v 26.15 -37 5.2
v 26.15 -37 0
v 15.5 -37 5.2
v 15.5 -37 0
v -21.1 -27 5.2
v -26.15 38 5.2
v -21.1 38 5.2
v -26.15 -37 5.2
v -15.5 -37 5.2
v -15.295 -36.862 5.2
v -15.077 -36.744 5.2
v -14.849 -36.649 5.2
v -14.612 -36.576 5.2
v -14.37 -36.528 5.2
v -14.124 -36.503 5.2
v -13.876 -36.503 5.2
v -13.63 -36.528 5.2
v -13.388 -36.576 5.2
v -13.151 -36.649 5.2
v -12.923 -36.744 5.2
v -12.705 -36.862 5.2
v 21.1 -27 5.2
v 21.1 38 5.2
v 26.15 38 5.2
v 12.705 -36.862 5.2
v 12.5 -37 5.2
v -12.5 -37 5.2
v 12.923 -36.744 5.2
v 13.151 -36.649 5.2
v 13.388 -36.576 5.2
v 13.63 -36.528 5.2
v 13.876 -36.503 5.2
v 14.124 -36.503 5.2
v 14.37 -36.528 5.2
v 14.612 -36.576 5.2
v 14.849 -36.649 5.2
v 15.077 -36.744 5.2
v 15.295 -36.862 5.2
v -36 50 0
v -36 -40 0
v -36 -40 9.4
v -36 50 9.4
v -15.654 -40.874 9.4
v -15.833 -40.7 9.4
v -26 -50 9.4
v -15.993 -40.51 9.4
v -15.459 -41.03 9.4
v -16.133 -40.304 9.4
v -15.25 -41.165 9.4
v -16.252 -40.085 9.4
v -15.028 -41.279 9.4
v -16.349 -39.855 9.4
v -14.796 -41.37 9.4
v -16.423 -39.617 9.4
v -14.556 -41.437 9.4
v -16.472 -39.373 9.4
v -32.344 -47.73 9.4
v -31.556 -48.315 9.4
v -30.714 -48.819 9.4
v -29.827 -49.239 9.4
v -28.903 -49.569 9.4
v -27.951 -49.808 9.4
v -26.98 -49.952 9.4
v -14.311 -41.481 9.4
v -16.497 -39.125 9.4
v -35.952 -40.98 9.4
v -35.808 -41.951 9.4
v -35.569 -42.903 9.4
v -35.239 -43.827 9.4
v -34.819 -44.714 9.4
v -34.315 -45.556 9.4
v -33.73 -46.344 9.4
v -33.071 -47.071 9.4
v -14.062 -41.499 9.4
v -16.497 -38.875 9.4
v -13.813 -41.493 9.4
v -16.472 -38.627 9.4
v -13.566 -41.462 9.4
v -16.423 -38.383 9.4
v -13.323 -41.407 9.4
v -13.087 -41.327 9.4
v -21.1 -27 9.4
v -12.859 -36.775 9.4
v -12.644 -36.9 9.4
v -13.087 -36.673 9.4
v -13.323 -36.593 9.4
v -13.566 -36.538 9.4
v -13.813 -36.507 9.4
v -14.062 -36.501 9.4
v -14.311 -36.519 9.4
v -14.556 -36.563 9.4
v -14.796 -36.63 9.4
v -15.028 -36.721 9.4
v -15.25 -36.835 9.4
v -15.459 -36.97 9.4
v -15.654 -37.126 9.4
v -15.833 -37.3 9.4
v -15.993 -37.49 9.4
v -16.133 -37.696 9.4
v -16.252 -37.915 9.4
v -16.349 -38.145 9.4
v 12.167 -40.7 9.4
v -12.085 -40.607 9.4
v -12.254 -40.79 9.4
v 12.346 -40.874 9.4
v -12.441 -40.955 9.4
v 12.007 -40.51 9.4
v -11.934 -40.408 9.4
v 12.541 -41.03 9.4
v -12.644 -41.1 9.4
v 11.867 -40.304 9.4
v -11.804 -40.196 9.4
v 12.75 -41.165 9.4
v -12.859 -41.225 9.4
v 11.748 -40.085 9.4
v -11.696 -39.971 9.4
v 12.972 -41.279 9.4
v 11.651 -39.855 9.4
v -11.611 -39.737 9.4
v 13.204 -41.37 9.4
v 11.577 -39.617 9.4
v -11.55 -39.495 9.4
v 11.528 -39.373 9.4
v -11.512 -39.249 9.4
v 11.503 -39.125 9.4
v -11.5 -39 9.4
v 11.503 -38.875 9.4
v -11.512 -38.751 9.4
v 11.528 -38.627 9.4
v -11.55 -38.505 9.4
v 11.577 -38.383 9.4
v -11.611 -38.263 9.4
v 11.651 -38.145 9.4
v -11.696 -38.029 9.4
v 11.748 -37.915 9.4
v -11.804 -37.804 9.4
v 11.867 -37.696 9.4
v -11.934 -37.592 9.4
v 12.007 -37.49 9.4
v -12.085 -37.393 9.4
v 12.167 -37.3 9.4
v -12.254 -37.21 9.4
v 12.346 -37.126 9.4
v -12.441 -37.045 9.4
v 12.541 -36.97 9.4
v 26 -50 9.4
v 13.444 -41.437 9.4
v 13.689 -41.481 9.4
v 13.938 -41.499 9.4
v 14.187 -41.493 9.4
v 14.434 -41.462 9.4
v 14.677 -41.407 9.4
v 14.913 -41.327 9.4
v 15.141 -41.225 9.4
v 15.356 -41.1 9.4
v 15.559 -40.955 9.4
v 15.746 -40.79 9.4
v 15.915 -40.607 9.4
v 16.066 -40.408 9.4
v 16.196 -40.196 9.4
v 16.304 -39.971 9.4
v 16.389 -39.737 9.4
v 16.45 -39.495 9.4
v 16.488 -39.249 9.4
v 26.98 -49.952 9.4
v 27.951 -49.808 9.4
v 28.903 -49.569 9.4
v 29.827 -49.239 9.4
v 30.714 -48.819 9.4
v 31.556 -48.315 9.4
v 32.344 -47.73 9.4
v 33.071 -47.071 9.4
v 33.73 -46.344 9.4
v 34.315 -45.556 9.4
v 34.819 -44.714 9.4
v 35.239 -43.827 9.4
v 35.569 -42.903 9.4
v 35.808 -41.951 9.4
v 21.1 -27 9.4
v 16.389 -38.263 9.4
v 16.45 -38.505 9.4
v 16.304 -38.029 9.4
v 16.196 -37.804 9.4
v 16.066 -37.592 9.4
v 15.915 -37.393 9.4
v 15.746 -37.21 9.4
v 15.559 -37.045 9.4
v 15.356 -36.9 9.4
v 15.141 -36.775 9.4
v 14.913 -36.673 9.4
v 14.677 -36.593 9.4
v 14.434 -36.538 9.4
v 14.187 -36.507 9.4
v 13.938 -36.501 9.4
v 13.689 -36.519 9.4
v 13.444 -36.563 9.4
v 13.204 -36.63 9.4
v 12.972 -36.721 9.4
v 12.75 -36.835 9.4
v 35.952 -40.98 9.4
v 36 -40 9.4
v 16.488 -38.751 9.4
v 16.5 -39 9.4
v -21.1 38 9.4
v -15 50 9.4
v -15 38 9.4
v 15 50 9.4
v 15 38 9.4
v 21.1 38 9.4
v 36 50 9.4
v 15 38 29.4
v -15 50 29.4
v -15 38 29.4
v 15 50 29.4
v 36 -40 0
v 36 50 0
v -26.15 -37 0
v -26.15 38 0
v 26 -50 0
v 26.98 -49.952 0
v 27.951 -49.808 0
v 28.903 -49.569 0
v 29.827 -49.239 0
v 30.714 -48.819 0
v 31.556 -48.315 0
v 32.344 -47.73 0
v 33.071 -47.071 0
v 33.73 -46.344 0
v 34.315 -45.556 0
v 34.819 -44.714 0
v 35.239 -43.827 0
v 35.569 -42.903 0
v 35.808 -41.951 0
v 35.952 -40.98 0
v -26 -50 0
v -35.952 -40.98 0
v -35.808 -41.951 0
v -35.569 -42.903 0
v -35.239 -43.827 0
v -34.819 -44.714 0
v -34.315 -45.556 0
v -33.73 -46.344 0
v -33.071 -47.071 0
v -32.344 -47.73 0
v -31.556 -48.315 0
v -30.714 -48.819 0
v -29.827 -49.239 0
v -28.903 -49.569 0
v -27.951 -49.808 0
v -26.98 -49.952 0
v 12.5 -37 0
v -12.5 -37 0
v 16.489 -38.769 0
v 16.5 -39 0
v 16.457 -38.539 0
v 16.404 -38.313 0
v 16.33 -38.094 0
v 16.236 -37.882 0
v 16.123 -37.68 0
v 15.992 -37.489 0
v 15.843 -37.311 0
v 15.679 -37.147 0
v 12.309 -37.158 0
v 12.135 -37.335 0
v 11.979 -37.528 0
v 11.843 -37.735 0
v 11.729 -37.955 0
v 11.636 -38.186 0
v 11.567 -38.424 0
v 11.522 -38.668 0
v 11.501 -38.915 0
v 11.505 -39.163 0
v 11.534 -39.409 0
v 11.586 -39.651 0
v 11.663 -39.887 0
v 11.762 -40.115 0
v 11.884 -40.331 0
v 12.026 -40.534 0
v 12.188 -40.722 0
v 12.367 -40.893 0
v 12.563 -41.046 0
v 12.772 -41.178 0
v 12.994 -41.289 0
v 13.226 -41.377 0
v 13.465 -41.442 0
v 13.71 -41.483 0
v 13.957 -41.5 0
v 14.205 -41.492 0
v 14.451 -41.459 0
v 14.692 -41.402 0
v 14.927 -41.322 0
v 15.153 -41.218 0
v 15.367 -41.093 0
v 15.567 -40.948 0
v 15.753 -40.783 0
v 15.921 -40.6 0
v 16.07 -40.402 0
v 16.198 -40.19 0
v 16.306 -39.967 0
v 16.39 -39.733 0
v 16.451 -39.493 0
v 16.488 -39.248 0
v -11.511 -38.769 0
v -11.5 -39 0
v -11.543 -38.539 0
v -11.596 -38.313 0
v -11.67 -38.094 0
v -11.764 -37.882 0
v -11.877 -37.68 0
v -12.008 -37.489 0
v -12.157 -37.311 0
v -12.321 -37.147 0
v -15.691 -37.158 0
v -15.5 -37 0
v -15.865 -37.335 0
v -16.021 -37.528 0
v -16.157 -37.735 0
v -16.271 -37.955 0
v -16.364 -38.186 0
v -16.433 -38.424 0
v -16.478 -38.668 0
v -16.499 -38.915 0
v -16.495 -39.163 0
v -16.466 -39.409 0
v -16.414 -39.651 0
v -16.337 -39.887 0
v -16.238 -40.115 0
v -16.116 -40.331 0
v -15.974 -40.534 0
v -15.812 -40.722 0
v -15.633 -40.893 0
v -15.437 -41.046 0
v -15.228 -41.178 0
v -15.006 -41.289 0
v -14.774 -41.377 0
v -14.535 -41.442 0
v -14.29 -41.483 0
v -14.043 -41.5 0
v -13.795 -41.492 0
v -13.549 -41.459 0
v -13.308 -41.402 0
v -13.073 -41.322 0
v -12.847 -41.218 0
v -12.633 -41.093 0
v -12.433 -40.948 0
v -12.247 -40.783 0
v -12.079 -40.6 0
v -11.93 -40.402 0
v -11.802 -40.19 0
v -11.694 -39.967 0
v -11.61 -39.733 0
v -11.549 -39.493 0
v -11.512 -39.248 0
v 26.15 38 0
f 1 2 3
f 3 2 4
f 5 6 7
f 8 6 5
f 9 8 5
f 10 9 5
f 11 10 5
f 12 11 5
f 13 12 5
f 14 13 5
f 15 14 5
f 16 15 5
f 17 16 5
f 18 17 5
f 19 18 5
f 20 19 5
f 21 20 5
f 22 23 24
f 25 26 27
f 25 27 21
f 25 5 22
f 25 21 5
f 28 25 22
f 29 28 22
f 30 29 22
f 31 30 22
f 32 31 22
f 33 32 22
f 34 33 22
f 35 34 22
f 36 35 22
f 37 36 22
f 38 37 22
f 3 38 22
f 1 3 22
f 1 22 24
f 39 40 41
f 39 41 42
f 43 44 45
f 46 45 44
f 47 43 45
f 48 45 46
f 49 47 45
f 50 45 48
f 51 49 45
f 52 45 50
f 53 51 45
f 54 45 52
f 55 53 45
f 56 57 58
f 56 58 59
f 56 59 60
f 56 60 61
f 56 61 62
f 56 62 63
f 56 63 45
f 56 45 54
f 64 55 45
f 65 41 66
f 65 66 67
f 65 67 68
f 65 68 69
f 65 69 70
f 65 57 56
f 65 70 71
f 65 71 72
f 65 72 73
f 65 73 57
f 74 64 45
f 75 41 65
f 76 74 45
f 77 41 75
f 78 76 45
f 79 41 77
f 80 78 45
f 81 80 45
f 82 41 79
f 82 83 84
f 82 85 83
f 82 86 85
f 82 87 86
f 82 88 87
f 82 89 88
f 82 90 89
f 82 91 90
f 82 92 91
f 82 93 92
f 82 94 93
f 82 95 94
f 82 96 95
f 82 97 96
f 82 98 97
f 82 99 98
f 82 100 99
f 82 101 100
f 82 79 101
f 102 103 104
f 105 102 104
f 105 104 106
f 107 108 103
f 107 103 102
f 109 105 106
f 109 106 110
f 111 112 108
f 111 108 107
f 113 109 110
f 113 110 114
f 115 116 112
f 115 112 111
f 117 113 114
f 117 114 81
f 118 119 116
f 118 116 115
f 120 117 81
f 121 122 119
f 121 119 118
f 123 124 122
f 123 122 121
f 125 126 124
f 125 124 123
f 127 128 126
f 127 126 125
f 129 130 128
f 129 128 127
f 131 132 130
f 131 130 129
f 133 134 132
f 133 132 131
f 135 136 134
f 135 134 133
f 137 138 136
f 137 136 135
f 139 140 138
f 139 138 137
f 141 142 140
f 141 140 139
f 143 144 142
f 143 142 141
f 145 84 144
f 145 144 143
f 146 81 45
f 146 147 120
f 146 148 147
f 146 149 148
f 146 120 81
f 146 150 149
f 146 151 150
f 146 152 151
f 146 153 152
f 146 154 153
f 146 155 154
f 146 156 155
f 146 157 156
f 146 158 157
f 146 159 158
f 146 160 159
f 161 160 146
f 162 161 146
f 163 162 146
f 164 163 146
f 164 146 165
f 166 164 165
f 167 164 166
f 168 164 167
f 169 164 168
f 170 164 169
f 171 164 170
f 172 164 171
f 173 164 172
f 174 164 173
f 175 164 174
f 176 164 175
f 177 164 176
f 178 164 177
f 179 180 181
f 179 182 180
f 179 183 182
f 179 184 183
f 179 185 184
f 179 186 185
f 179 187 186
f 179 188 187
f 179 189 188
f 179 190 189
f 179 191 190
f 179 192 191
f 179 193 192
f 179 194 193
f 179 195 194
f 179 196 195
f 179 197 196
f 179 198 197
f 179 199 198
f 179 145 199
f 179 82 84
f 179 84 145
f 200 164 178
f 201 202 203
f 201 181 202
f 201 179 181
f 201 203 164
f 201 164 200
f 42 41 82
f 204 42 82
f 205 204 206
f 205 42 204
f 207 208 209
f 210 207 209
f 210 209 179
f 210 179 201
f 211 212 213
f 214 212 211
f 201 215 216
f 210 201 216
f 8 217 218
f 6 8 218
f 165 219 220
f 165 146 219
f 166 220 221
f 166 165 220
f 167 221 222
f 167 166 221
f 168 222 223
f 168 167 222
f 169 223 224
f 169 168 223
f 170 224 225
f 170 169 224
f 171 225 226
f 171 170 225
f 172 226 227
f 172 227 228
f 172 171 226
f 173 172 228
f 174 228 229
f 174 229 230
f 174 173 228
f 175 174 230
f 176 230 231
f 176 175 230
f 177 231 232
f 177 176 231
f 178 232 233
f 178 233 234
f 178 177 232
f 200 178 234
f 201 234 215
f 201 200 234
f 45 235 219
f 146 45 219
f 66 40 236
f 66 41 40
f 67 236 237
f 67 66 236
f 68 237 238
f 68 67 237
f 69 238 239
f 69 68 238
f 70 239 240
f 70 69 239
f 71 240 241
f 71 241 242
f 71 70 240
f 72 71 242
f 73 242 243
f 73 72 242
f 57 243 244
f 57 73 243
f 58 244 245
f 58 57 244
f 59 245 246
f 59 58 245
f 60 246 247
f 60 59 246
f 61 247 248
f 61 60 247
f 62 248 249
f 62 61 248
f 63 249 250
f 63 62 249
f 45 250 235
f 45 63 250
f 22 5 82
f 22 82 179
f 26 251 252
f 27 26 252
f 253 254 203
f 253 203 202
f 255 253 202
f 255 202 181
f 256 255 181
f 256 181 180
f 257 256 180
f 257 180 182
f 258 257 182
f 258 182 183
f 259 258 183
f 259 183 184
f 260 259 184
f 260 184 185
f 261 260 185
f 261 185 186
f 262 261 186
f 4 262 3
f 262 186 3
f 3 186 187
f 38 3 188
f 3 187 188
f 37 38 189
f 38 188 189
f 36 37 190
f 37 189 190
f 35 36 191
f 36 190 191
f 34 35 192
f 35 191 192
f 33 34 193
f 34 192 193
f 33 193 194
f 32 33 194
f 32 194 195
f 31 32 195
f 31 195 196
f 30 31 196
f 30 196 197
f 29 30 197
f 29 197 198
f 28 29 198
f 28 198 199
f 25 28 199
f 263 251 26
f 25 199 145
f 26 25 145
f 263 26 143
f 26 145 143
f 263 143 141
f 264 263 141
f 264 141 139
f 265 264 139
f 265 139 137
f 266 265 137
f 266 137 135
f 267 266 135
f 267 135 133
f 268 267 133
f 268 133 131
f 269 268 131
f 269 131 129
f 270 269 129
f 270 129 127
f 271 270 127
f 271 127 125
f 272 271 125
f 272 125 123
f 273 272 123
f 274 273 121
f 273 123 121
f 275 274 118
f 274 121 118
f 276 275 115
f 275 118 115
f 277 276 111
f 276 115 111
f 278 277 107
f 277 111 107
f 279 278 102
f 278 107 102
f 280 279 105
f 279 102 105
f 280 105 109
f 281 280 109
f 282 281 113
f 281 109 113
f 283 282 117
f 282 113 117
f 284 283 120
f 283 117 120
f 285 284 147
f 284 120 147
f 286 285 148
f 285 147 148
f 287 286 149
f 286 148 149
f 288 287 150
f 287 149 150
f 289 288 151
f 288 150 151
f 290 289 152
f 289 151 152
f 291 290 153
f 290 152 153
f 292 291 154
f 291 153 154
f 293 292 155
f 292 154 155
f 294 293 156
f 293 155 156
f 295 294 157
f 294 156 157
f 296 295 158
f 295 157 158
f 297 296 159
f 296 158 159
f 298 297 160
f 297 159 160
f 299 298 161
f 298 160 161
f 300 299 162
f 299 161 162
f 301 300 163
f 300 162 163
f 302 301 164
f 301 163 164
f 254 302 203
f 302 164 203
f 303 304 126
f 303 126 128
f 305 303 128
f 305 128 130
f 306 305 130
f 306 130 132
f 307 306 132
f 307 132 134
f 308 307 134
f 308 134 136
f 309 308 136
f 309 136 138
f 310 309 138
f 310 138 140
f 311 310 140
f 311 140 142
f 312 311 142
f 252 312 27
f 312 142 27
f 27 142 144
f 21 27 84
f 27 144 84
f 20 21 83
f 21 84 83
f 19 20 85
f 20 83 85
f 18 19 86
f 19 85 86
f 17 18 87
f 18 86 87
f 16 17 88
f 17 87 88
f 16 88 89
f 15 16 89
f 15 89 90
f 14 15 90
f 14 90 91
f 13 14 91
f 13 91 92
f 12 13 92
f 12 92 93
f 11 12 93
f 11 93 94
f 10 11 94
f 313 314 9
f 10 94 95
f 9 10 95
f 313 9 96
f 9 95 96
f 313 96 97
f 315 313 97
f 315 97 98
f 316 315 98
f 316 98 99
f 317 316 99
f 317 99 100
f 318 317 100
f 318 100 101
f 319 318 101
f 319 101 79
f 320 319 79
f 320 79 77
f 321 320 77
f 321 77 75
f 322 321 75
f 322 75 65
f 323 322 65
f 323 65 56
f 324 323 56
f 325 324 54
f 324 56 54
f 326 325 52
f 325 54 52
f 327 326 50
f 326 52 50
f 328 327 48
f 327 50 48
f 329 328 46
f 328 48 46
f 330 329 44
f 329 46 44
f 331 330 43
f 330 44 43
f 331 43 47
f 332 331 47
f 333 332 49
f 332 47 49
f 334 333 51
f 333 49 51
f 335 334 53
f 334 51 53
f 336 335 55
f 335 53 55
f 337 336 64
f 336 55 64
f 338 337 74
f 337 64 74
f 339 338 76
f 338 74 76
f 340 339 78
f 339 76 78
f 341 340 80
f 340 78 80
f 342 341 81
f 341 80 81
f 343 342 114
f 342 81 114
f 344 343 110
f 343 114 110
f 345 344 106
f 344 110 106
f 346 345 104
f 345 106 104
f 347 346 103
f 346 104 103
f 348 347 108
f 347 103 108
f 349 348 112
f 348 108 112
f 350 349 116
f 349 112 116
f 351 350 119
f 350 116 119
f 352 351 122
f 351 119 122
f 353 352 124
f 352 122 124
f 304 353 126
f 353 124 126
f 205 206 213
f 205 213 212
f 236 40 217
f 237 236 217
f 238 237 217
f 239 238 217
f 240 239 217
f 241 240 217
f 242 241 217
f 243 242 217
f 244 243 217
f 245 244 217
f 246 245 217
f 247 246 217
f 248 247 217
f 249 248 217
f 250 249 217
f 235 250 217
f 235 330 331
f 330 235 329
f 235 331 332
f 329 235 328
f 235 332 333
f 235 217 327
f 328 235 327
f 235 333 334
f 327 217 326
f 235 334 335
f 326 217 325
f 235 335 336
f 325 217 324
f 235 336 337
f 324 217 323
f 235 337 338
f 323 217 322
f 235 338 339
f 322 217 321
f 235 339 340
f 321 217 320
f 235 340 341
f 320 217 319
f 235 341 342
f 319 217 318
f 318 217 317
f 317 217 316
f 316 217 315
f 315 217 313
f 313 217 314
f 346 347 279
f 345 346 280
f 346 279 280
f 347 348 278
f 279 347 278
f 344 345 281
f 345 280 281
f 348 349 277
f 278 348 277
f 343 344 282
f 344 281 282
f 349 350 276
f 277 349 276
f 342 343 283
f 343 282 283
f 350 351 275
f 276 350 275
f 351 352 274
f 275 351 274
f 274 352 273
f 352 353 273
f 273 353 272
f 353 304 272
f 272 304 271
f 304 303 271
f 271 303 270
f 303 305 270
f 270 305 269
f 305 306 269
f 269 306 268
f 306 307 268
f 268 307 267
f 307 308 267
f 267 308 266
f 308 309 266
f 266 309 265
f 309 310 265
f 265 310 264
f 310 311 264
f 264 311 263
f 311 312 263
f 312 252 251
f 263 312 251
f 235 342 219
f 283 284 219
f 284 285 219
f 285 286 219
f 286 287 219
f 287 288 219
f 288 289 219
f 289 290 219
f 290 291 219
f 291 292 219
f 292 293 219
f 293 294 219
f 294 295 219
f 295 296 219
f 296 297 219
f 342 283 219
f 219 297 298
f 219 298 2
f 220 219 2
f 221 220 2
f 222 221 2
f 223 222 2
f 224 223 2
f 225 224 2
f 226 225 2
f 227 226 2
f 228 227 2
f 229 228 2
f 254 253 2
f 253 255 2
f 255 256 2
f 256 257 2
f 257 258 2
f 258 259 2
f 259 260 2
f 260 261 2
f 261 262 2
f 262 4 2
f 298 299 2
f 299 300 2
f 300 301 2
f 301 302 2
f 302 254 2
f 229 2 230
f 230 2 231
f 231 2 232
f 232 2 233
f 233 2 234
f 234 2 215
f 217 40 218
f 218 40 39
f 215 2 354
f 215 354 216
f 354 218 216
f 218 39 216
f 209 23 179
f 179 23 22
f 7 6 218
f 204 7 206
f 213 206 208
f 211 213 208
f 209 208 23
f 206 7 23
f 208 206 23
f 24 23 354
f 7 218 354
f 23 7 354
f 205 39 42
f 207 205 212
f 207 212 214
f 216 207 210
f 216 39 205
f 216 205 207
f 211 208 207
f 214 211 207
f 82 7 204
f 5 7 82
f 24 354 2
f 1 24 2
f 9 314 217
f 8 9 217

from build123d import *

# Parameters (mm, degrees)
F0_W     = 72
F0_H     = 100
F1_DEPTH = 9.4
F2_W     = 42.2
F2_H     = 65
F3_DEPTH = 5.2
F4_DEPTH = 9.4
F5_W     = 30
F5_H     = 12
F6_DEPTH = 20
F7_R     = 2.5
F8_DEPTH = 9.4
F9_R     = 10


# Not quite as in the source:
# - a feature names something its author has since deleted; it is built from what else it names


with BuildPart() as f1:
    # F0 (on Top) → F1 (new body)
    with BuildSketch(Plane.XY):
        Rectangle(F0_W, F0_H)
    extrude(amount=F1_DEPTH)

    # F2 (on face) → F3 (cut)
    with BuildSketch(Plane(origin=(0, 0, 0), x_dir=(1, 0, 0), z_dir=(0, 0, -1))):
        Polygon((21.1, -38), (26.15, -38), (26.15, 37), (-26.15, 37), (-26.15, -38), (-21.1, -38), (-21.1, 27), (21.1, 27), align=None)
        with Locations((0, -5.5)):
            Rectangle(F2_W, F2_H)
    extrude(amount=-F3_DEPTH, mode=Mode.SUBTRACT)

    # F2 (on face) → F4 (cut, through all)
    with BuildSketch(Plane(origin=(0, 0, 0), x_dir=(1, 0, 0), z_dir=(0, 0, -1))):
        with Locations((0, -5.5)):
            Rectangle(F2_W, F2_H)
    extrude(amount=-F4_DEPTH, mode=Mode.SUBTRACT)

    # F5 (on face) → F6 (join)
    with BuildSketch(Plane.XY.offset(9.4)):
        with Locations((0, 44)):
            Rectangle(F5_W, F5_H)
    extrude(amount=F6_DEPTH)

    # F7 (on face) → F8 (cut, through all)
    with BuildSketch(Plane.XY.offset(9.4)):
        with Locations((-14, -39)):
            Circle(F7_R)
        with Locations((14, -39)):
            Circle(F7_R)
    extrude(amount=-F8_DEPTH, mode=Mode.SUBTRACT)

    # F9
    f9_edges = [f1.edges().sort_by_distance(p)[0] for p in [
        (36, -50, 4.7),
        (-36, -50, 4.7),
    ]]
    fillet(f9_edges, radius=F9_R)


solid = f1.part
